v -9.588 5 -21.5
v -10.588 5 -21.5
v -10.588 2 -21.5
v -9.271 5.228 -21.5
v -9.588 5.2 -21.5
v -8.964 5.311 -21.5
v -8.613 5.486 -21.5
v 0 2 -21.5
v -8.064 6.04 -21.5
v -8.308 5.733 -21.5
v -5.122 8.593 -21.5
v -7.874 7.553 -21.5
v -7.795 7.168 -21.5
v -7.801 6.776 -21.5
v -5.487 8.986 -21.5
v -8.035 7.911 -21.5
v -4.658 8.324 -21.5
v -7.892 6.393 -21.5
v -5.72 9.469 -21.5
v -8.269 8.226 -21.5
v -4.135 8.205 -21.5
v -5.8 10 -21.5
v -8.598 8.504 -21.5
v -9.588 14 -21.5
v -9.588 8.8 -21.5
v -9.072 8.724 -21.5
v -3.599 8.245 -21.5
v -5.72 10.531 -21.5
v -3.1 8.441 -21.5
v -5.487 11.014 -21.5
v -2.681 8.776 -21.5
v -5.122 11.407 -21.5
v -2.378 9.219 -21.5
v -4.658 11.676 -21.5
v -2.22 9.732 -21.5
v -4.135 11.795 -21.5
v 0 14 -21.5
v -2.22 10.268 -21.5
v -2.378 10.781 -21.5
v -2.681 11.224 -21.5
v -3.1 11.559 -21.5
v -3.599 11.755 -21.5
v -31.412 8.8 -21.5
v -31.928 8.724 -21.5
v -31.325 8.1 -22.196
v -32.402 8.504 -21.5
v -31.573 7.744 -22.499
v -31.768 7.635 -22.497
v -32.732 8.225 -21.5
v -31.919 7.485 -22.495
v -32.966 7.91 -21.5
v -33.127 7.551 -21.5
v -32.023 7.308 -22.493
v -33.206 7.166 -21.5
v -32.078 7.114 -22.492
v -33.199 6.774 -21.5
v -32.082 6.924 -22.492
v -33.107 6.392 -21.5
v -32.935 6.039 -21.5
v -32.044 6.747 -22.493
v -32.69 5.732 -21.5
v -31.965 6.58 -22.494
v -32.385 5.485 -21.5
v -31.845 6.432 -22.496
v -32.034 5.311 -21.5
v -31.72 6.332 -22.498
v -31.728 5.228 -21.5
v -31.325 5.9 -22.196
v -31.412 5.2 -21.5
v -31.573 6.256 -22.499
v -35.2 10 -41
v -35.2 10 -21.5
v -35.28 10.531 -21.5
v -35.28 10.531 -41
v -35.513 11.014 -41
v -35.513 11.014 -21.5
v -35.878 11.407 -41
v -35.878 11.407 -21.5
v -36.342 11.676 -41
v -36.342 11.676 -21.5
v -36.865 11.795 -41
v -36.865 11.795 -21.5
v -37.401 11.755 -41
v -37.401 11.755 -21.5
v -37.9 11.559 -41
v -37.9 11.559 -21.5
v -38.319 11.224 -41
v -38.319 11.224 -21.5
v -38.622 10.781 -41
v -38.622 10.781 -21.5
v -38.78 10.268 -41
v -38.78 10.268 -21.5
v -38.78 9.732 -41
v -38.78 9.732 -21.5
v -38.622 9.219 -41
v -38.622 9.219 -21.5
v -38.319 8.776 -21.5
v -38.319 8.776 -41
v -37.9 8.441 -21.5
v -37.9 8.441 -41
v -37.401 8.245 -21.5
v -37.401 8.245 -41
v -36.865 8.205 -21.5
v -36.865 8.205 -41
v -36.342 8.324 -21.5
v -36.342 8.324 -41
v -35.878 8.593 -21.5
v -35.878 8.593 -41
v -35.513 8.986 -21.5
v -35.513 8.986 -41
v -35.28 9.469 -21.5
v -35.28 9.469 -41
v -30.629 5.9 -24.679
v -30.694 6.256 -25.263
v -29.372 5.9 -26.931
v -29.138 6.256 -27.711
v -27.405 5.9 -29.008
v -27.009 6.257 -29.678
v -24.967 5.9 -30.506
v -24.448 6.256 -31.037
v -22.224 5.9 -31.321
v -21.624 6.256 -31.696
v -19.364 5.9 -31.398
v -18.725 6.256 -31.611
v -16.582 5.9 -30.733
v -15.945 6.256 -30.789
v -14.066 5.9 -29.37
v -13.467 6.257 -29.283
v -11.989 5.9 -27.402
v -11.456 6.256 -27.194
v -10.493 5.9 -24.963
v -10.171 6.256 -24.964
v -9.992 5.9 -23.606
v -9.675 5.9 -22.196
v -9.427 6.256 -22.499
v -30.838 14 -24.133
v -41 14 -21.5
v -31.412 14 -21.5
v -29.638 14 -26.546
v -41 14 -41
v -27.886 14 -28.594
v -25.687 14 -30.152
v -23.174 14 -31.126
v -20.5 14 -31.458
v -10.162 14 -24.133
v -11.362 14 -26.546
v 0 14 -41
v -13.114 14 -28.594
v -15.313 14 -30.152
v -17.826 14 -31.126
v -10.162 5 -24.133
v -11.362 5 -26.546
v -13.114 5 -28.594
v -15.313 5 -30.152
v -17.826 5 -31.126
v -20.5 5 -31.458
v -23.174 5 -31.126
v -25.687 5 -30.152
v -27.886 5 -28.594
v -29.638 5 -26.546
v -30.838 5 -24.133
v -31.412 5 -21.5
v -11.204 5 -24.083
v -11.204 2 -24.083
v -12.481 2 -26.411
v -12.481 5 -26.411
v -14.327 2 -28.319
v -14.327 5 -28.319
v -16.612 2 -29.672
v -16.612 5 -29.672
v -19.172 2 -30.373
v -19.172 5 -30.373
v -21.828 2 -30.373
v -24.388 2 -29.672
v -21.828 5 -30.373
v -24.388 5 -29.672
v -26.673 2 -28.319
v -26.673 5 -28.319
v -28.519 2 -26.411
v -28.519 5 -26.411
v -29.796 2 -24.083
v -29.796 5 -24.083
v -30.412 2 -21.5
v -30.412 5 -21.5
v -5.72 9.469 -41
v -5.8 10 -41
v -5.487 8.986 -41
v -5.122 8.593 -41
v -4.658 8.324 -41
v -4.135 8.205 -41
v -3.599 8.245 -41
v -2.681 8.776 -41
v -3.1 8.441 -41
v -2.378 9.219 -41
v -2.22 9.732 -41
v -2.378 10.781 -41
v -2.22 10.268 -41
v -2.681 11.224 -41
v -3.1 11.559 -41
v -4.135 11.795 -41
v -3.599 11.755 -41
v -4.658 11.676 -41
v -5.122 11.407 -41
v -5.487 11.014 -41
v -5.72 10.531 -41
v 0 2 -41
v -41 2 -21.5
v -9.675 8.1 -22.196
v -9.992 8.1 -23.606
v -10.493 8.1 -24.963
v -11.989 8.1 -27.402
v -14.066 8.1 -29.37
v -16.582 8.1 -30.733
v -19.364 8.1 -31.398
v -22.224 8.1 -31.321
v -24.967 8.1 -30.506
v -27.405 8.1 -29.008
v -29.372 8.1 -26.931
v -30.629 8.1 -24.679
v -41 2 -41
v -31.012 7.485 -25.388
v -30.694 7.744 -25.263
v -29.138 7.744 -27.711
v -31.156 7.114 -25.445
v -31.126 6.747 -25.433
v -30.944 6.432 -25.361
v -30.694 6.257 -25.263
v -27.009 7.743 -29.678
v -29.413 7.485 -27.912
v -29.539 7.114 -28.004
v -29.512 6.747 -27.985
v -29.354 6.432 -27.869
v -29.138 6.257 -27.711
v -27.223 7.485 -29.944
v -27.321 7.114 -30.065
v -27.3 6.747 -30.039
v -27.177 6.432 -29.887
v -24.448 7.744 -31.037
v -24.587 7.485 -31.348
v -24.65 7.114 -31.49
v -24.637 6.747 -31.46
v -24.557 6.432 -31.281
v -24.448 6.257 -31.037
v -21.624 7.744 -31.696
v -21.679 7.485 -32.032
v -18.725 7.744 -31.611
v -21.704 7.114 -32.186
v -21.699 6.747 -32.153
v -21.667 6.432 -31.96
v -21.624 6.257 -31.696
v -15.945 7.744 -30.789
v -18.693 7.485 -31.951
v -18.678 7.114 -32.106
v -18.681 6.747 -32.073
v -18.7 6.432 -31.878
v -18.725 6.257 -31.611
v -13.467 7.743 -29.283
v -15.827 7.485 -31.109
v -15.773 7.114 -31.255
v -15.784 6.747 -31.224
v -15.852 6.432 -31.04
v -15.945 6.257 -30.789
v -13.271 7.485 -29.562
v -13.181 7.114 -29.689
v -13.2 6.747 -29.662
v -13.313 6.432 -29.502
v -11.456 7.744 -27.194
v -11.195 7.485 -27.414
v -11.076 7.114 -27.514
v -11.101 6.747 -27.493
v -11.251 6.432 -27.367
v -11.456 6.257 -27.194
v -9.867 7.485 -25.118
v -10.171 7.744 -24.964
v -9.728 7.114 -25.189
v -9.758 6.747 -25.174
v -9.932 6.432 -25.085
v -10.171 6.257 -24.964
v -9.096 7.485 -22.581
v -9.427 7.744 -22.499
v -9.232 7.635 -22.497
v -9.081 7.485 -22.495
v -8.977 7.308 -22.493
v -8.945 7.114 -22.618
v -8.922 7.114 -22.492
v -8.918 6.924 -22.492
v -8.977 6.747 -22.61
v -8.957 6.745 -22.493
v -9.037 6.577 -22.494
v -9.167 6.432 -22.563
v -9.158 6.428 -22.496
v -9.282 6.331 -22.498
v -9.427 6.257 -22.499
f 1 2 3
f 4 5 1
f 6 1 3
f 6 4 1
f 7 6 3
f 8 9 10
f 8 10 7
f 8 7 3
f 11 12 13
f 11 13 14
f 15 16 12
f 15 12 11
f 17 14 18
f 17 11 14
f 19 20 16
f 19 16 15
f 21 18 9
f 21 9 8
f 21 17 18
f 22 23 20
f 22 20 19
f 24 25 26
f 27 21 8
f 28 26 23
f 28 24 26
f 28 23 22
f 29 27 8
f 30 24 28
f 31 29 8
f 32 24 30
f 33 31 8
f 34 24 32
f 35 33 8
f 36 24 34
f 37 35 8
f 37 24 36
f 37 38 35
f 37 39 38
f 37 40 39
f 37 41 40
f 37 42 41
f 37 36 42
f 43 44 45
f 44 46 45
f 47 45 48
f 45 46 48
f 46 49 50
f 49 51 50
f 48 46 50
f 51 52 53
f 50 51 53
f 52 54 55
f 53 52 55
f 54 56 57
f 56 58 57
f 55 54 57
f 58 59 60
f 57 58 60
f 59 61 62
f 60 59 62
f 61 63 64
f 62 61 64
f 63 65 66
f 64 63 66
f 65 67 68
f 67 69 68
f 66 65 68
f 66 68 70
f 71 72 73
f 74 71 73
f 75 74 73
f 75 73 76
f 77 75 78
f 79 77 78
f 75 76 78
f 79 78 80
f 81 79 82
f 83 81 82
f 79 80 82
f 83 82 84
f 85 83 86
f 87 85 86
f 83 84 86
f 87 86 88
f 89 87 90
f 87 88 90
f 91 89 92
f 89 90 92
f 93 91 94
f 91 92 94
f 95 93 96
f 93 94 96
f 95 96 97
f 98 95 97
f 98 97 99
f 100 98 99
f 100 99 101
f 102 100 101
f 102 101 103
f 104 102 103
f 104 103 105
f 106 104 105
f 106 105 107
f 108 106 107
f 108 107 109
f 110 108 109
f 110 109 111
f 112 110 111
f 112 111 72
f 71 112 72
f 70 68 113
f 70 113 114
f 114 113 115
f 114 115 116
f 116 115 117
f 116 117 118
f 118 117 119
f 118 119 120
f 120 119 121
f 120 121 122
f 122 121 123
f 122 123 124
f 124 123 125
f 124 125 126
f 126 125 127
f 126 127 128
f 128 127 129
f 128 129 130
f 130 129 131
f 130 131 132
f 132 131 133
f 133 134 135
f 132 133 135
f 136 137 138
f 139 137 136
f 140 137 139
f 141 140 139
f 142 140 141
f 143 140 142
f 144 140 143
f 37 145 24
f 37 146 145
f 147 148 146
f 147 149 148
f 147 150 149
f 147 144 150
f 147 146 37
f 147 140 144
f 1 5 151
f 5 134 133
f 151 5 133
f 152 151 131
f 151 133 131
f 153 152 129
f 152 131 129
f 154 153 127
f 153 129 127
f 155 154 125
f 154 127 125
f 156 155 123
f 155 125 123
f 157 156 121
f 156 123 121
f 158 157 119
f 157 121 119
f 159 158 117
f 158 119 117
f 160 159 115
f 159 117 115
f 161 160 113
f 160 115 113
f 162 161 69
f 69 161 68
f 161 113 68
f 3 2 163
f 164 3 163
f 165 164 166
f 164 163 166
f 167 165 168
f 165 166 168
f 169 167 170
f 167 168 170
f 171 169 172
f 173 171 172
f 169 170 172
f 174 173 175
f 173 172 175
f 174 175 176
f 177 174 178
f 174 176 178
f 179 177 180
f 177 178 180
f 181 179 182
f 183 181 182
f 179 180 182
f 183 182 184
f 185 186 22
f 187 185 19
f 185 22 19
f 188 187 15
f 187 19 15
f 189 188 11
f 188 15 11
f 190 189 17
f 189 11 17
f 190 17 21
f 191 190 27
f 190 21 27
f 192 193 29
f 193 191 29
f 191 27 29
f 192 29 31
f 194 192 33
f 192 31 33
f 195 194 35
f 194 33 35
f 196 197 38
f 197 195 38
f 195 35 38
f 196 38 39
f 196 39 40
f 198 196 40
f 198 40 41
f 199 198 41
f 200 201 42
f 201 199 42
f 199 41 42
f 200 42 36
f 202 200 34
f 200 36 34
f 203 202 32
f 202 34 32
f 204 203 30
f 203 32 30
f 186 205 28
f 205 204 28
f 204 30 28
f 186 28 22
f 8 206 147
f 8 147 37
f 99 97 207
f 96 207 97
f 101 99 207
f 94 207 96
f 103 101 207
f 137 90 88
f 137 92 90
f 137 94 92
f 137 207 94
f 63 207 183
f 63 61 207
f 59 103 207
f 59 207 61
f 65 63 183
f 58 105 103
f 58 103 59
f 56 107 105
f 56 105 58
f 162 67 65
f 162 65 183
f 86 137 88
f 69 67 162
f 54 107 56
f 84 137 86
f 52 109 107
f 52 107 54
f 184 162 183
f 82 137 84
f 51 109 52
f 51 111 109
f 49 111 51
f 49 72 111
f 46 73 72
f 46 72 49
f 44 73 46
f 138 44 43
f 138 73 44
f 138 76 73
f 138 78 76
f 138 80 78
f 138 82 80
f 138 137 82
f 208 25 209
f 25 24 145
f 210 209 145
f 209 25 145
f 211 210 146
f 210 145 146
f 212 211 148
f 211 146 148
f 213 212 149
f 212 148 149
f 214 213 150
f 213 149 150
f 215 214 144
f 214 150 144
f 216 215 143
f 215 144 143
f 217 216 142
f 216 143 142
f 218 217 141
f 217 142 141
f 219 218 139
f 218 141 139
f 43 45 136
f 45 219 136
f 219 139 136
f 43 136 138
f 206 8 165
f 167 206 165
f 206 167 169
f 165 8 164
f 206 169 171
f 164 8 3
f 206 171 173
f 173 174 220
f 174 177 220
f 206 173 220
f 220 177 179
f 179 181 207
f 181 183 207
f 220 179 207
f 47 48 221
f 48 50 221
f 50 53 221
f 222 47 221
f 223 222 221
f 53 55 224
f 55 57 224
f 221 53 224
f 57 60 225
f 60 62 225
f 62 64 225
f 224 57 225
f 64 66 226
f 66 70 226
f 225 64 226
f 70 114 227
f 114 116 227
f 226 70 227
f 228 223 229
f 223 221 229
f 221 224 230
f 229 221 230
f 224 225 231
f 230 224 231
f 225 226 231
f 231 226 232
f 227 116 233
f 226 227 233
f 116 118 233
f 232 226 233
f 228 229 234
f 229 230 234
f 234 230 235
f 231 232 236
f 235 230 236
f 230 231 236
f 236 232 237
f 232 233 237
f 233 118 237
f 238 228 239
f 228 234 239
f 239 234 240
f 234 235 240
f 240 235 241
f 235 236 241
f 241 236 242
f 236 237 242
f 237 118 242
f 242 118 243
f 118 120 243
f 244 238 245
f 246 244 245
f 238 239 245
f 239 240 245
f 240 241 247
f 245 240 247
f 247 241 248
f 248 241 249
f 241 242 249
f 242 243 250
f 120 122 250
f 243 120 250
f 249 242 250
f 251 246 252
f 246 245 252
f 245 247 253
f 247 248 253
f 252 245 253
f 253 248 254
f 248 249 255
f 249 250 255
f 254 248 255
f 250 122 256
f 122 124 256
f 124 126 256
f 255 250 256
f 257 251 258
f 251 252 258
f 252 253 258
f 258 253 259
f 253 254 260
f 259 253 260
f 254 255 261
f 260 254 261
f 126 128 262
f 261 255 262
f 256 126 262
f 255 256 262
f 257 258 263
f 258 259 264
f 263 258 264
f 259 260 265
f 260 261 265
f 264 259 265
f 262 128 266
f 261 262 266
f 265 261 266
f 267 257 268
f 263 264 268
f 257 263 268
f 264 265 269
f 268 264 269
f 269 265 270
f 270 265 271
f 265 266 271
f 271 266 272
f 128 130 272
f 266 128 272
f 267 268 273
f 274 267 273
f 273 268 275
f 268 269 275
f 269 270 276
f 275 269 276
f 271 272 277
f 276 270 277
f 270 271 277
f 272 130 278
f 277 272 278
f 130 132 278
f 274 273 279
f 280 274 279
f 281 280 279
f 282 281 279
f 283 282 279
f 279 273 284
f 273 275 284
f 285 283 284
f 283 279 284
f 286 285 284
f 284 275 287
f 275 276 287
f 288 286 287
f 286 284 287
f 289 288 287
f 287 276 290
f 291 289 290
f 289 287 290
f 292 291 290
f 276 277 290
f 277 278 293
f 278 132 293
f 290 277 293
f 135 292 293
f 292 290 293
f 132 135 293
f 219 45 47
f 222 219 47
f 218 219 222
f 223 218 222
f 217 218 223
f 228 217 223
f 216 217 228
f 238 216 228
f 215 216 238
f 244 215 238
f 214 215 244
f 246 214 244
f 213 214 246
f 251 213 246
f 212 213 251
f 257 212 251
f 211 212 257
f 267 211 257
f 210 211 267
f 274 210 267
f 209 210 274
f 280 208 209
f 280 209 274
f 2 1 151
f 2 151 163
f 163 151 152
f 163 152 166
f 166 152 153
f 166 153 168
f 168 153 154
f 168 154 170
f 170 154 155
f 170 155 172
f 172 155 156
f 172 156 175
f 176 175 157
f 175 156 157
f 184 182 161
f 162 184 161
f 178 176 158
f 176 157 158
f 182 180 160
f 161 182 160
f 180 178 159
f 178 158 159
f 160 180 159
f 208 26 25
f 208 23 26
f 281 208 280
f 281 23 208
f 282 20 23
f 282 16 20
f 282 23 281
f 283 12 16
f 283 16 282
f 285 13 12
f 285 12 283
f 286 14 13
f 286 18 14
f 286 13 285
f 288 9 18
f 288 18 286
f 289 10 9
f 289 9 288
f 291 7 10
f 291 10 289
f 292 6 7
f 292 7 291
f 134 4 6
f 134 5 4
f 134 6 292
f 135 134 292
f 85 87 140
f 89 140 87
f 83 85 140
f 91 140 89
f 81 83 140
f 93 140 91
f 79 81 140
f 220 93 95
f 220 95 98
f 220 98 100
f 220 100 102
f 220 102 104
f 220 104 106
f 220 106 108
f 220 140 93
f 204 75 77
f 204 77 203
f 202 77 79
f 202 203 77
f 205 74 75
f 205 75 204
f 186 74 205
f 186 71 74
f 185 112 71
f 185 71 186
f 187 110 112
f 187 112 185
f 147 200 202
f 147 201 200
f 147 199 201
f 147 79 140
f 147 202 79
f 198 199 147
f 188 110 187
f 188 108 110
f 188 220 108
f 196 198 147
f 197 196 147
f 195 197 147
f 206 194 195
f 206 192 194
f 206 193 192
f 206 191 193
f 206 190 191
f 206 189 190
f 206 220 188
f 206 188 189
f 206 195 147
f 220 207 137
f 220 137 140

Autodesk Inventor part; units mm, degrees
ref_plane "YZ Plane" through (0, 0, 0) normal (1, 0, 0) x (0, 1, 0)
ref_plane "XZ Plane" through (0, 0, 0) normal (0, 1, 0) x (-1, 0, 0)
sketch "Sketch1" plane through (0, 0, 0) normal (0, 1, 0) x (-1, 0, 0)
  line L0 (0, 0) -> (41, 0)
  line L1 (41, 0) -> (41, -41)
  line L2 (41, -41) -> (0, -41)
  line L3 (0, -41) -> (0, 0)
  dimension "d0" = 41
  dimension "d1" = 41
extrude "Extrusion1" add sketch "Sketch1" along normal blind 9.5
sketch "Sketch3" plane through (0, 9.5, 0) normal (0, 1, 0) x (1, 0, 0)
  circle A0 centre (-20.5, 20.5) radius 10
  point P0 (0, 0)
  dimension "d5" = 20
extrude "Extrusion2" cut sketch "Sketch3" against normal blind 10
sketch "Sketch4" plane through (0, 9.5, 0) normal (0, 1, 0) x (1, 0, 0)
  circle A0 centre (-20.5, 20.5) radius 10 projected
  circle A1 centre (-20.5, 20.5) radius 11.75
  point P0 (0, 0)
  dimension "d8" = 23.5
extrude "Extrusion3" cut sketch "Sketch4" against normal blind 5
sketch "Sketch5" plane through (0, 9.5, 0) normal (0, 1, 0) x (1, 0, 0)
  line L0 (-41, 41) -> (-41, 0) projected
  line L1 (-41, 0) -> (0, 0)
  line L2 (0, 0) -> (0, 41)
  line L3 (0, 41) -> (-41, 41)
  line L4 (-41, 41) -> (-41, 0)
  circle A0 centre (-20.5, 20.5) radius 11.75 projected
  circle A1 centre (-20.5, 20.5) radius 10
extrude "Extrusion4" add sketch "Sketch5" along normal blind 4.5 contours L3 L2 L1 L0 | A0
sketch "Sketch6" plane through (-41, 0, 0) normal (0, 0, 1) x (1, 0, 0)
  line L0 (0, 0) -> (0, 14) projected
  line L1 (0, 14) -> (41, 14)
  line L2 (41, 14) -> (41, 0)
  line L3 (41, 0) -> (0, 0)
  line L4 (0, 0) -> (0, 14)
extrude "Extrusion5" cut sketch "Sketch6" against normal blind 20.5
sketch "Sketch8" plane through (-41, 0, -20.5) normal (0, 0, 1) x (1, 0, 0)
  circle A0 centre (4, 10) radius 1.8
  point P0 (41, 0)
  dimension "d15" = 3.6
extrude "Extrusion6" cut sketch "Sketch8" against normal blind 20.5
ref_plane "Work Plane1" through (-20.5, 0, -41) normal (1, 0, 0) x (0, 0, -1)
mirror "Mirror1" about plane through (-20.5, 0, -41) normal (1, 0, 0) of "Extrusion6"
sketch "Sketch9" plane through (-41, 0, -20.5) normal (0, 0, 1) x (1, 0, 0)
  line L0 (10.5, 14) -> (10.5, 9.5) projected
  line L1 (8.75, 4.5) -> (10.5, 4.5) projected
  line L2 (10.5, 9.5) -> (8.75, 9.5)
  line L3 (8.75, 9.5) -> (8.75, 4.5)
  line L4 (8.75, 4.5) -> (10.5, 4.5)
  line L5 (10.5, 4.5) -> (10.5, 9.5)
  point P0 (41, 0)
sketch "Sketch11" plane through (0, 4.5, 0) normal (0, 1, 0) x (1, 0, 0)
  arc A0 (-10.5, 20.5) -> (-30.5, 20.5) centre (-20.5, 20.5) ccw projected
  arc A1 (-9.625, 20.5) -> (-31.375, 20.5) centre (-20.5, 20.5) ccw
  line L0 (-41, 41) -> (-41, 20.5) projected
  point P0 (0, 0)
sweep "Sweep1" add profiles "Sketch9" path "Sketch11" path curves A1
sketch "Sketch12" plane through (-41, 0, -20.5) normal (0, 0, 1) x (1, 0, 0)
  line L0 (10.5, 14) -> (10.5, 0) projected
  circle A0 centre (10.5, 7) radius 0.8
  point P0 (41, 0)
  dimension "d21" = 1.6
sketch3d "3D Sketch1"
  arc A0 (-30.5, 14, -20.5) -> (-27.5711, 14, -27.5711) centre (-20.5, 14, -20.5) ccw
  arc A1 (-27.5711, 14, -27.5711) -> (-20.5, 14, -30.5) centre (-20.5, 14, -20.5) ccw
  arc A2 (-20.5, 14, -30.5) -> (-13.4289, 14, -27.5711) centre (-20.5, 14, -20.5) ccw
  arc A3 (-13.4289, 14, -27.5711) -> (-10.5, 14, -20.5) centre (-20.5, 14, -20.5) ccw
sweep "Sweep2" cut profiles "Sketch12" path "3D Sketch1"
sketch "Sketch13" plane through (0, 0, 0) normal (0, -1, 0) x (1, 0, 0)
  line L0 (-53.975, -9.525) -> (46.0375, -9.525)
  line L1 (46.0375, -9.525) -> (46.0375, -71.4375)
  line L2 (46.0375, -71.4375) -> (-53.975, -71.4375)
  line L3 (-53.975, -71.4375) -> (-53.975, -9.525)
  point P0 (0, 0)
extrude "Extrusion7" cut sketch "Sketch13" against normal blind 2
sketch "Sketch14" plane through (-41, 0, -20.5) normal (0, 0, 1) x (1, 0, 0)
  line L0 (-1.5875, 15.875) -> (46.0375, 15.875)
  line L1 (46.0375, 15.875) -> (46.0375, -1.5875)
  line L2 (46.0375, -1.5875) -> (-1.5875, -1.5875)
  line L3 (-1.5875, -1.5875) -> (-1.5875, 15.875)
  point P0 (41, 0)
extrude "Extrusion8" cut sketch "Sketch14" against normal blind 0.7
sketch "Sketch15" plane through (0, 14, 0) normal (0, 1, 0) x (1, 0, 0)
  arc A0 (-10.5245, 21.2) -> (-30.4755, 21.2) centre (-20.5, 20.5) ccw projected
  circle A1 centre (-20.5, 20.5) radius 10.9575
  point P0 (0, 0)
  dimension "d28" = 21.915
extrude "Extrusion9" cut sketch "Sketch15" against normal blind 15
sketch "Sketch16" plane through (-41, 0, -21.2) normal (0, 0, 1) x (1, 0, 0)
  line L0 (9.5649, 2) -> (9.5649, 14) projected
  circle A0 centre (9.5649, 7) radius 0.8
  point P0 (41, 0)
  dimension "d31" = 1.6
sketch "Sketch17" plane through (0, 14, 0) normal (0, 1, 0) x (1, 0, 0)
  arc A0 (-9.5649, 21.2) -> (-31.4351, 21.2) centre (-20.5, 20.5) ccw projected
  arc A1 (-7.5073, 21.2) -> (-33.4927, 21.2) centre (-20.5, 20.5) ccw
  point P0 (0, 0)
sketch3d "3D Sketch2"
  arc A0 (-31.4351, 14, -21.2) -> (-9.5649, 14, -21.2) centre (-20.5, 14, -20.5) ccw
sweep "Sweep3" cut profiles "Sketch16" path "3D Sketch2"
sketch "Sketch18" plane through (-41, 0, -21.2) normal (0, 0, 1) x (1, 0, 0)
  line L0 (31.4351, 7.8) -> (31.4351, 6.2) projected
  circle A0 centre (31.4351, 7) radius 0.8
  point P0 (41, 0)
sketch3d "3D Sketch3"
  arc A0 (-9.5649, 14, -21.2) -> (-31.4351, 14, -21.2) centre (-20.5, 14, -20.5) ccw
sweep "Sweep4" cut profiles "Sketch18" path "3D Sketch3"
sketch "Sketch19" plane through (-41, 0, -21.2) normal (0, 0, 1) x (1, 0, 0)
  line L0 (0, 2) -> (0, 14) projected
  line L1 (41, 2) -> (41, 14) projected
  line L2 (0, 14) -> (41, 14)
  line L3 (41, 14) -> (41, 2)
  line L4 (41, 2) -> (0, 2)
  line L5 (0, 2) -> (0, 14)
  point P0 (41, 0)
extrude "Extrusion10" cut sketch "Sketch19" against normal blind 0.3
sketch "Sketch20" plane through (-41, 0, -21.5) normal (0, 0, 1) x (1, 0, 0)
  line L0 (9.5882, 6.2) -> (9.5882, 2) projected
  line L1 (9.5882, 2) -> (10.5882, 2)
  line L2 (10.5882, 2) -> (10.5882, 5)
  line L3 (10.5882, 5) -> (9.5882, 5)
  line L4 (9.5882, 5) -> (9.5882, 2)
  point P0 (41, 0)
  dimension "d38" = 1
  dimension "d39" = 3
sweep "Sweep5" add profiles "Sketch20" path "Sketch17" path curves A0
sketch "Sketch21" plane through (-41, 0, -21.5) normal (0, 0, 1) x (1, 0, 0)
  line L0 (0, 2) -> (0, 14) projected
  line L1 (41, 2) -> (0, 2) projected
  line L2 (0, 14) -> (41, 14)
  line L3 (41, 14) -> (41, 2)
  line L4 (41, 2) -> (0, 2)
  line L5 (0, 2) -> (0, 14)
  point P0 (41, 0)
extrude "Extrusion11" cut sketch "Sketch21" along normal blind 10
chamfer "Chamfer1" distance 1 angle 45 2 edges at (-8.7866, 7, -21.5) (-32.2134, 7, -21.5)
chamfer "Chamfer2" distance 0.3 angle 45 2 edges at (-20.4996, 7.8, -31.4575) (-20.4997, 6.2, -31.4575)
properties part number "7 peristaltic pump lid with lip2"
